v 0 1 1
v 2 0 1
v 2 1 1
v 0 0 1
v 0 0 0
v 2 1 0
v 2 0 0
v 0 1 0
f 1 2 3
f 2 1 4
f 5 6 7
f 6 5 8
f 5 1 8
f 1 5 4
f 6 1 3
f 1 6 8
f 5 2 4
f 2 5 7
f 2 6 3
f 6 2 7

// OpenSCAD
for (i = [0:1]) translate([i, 0, 0]) cube();
for (i = [0:1], j = [0:1]) cube();
for (i = []) cube();
for (i = [0]) { }
